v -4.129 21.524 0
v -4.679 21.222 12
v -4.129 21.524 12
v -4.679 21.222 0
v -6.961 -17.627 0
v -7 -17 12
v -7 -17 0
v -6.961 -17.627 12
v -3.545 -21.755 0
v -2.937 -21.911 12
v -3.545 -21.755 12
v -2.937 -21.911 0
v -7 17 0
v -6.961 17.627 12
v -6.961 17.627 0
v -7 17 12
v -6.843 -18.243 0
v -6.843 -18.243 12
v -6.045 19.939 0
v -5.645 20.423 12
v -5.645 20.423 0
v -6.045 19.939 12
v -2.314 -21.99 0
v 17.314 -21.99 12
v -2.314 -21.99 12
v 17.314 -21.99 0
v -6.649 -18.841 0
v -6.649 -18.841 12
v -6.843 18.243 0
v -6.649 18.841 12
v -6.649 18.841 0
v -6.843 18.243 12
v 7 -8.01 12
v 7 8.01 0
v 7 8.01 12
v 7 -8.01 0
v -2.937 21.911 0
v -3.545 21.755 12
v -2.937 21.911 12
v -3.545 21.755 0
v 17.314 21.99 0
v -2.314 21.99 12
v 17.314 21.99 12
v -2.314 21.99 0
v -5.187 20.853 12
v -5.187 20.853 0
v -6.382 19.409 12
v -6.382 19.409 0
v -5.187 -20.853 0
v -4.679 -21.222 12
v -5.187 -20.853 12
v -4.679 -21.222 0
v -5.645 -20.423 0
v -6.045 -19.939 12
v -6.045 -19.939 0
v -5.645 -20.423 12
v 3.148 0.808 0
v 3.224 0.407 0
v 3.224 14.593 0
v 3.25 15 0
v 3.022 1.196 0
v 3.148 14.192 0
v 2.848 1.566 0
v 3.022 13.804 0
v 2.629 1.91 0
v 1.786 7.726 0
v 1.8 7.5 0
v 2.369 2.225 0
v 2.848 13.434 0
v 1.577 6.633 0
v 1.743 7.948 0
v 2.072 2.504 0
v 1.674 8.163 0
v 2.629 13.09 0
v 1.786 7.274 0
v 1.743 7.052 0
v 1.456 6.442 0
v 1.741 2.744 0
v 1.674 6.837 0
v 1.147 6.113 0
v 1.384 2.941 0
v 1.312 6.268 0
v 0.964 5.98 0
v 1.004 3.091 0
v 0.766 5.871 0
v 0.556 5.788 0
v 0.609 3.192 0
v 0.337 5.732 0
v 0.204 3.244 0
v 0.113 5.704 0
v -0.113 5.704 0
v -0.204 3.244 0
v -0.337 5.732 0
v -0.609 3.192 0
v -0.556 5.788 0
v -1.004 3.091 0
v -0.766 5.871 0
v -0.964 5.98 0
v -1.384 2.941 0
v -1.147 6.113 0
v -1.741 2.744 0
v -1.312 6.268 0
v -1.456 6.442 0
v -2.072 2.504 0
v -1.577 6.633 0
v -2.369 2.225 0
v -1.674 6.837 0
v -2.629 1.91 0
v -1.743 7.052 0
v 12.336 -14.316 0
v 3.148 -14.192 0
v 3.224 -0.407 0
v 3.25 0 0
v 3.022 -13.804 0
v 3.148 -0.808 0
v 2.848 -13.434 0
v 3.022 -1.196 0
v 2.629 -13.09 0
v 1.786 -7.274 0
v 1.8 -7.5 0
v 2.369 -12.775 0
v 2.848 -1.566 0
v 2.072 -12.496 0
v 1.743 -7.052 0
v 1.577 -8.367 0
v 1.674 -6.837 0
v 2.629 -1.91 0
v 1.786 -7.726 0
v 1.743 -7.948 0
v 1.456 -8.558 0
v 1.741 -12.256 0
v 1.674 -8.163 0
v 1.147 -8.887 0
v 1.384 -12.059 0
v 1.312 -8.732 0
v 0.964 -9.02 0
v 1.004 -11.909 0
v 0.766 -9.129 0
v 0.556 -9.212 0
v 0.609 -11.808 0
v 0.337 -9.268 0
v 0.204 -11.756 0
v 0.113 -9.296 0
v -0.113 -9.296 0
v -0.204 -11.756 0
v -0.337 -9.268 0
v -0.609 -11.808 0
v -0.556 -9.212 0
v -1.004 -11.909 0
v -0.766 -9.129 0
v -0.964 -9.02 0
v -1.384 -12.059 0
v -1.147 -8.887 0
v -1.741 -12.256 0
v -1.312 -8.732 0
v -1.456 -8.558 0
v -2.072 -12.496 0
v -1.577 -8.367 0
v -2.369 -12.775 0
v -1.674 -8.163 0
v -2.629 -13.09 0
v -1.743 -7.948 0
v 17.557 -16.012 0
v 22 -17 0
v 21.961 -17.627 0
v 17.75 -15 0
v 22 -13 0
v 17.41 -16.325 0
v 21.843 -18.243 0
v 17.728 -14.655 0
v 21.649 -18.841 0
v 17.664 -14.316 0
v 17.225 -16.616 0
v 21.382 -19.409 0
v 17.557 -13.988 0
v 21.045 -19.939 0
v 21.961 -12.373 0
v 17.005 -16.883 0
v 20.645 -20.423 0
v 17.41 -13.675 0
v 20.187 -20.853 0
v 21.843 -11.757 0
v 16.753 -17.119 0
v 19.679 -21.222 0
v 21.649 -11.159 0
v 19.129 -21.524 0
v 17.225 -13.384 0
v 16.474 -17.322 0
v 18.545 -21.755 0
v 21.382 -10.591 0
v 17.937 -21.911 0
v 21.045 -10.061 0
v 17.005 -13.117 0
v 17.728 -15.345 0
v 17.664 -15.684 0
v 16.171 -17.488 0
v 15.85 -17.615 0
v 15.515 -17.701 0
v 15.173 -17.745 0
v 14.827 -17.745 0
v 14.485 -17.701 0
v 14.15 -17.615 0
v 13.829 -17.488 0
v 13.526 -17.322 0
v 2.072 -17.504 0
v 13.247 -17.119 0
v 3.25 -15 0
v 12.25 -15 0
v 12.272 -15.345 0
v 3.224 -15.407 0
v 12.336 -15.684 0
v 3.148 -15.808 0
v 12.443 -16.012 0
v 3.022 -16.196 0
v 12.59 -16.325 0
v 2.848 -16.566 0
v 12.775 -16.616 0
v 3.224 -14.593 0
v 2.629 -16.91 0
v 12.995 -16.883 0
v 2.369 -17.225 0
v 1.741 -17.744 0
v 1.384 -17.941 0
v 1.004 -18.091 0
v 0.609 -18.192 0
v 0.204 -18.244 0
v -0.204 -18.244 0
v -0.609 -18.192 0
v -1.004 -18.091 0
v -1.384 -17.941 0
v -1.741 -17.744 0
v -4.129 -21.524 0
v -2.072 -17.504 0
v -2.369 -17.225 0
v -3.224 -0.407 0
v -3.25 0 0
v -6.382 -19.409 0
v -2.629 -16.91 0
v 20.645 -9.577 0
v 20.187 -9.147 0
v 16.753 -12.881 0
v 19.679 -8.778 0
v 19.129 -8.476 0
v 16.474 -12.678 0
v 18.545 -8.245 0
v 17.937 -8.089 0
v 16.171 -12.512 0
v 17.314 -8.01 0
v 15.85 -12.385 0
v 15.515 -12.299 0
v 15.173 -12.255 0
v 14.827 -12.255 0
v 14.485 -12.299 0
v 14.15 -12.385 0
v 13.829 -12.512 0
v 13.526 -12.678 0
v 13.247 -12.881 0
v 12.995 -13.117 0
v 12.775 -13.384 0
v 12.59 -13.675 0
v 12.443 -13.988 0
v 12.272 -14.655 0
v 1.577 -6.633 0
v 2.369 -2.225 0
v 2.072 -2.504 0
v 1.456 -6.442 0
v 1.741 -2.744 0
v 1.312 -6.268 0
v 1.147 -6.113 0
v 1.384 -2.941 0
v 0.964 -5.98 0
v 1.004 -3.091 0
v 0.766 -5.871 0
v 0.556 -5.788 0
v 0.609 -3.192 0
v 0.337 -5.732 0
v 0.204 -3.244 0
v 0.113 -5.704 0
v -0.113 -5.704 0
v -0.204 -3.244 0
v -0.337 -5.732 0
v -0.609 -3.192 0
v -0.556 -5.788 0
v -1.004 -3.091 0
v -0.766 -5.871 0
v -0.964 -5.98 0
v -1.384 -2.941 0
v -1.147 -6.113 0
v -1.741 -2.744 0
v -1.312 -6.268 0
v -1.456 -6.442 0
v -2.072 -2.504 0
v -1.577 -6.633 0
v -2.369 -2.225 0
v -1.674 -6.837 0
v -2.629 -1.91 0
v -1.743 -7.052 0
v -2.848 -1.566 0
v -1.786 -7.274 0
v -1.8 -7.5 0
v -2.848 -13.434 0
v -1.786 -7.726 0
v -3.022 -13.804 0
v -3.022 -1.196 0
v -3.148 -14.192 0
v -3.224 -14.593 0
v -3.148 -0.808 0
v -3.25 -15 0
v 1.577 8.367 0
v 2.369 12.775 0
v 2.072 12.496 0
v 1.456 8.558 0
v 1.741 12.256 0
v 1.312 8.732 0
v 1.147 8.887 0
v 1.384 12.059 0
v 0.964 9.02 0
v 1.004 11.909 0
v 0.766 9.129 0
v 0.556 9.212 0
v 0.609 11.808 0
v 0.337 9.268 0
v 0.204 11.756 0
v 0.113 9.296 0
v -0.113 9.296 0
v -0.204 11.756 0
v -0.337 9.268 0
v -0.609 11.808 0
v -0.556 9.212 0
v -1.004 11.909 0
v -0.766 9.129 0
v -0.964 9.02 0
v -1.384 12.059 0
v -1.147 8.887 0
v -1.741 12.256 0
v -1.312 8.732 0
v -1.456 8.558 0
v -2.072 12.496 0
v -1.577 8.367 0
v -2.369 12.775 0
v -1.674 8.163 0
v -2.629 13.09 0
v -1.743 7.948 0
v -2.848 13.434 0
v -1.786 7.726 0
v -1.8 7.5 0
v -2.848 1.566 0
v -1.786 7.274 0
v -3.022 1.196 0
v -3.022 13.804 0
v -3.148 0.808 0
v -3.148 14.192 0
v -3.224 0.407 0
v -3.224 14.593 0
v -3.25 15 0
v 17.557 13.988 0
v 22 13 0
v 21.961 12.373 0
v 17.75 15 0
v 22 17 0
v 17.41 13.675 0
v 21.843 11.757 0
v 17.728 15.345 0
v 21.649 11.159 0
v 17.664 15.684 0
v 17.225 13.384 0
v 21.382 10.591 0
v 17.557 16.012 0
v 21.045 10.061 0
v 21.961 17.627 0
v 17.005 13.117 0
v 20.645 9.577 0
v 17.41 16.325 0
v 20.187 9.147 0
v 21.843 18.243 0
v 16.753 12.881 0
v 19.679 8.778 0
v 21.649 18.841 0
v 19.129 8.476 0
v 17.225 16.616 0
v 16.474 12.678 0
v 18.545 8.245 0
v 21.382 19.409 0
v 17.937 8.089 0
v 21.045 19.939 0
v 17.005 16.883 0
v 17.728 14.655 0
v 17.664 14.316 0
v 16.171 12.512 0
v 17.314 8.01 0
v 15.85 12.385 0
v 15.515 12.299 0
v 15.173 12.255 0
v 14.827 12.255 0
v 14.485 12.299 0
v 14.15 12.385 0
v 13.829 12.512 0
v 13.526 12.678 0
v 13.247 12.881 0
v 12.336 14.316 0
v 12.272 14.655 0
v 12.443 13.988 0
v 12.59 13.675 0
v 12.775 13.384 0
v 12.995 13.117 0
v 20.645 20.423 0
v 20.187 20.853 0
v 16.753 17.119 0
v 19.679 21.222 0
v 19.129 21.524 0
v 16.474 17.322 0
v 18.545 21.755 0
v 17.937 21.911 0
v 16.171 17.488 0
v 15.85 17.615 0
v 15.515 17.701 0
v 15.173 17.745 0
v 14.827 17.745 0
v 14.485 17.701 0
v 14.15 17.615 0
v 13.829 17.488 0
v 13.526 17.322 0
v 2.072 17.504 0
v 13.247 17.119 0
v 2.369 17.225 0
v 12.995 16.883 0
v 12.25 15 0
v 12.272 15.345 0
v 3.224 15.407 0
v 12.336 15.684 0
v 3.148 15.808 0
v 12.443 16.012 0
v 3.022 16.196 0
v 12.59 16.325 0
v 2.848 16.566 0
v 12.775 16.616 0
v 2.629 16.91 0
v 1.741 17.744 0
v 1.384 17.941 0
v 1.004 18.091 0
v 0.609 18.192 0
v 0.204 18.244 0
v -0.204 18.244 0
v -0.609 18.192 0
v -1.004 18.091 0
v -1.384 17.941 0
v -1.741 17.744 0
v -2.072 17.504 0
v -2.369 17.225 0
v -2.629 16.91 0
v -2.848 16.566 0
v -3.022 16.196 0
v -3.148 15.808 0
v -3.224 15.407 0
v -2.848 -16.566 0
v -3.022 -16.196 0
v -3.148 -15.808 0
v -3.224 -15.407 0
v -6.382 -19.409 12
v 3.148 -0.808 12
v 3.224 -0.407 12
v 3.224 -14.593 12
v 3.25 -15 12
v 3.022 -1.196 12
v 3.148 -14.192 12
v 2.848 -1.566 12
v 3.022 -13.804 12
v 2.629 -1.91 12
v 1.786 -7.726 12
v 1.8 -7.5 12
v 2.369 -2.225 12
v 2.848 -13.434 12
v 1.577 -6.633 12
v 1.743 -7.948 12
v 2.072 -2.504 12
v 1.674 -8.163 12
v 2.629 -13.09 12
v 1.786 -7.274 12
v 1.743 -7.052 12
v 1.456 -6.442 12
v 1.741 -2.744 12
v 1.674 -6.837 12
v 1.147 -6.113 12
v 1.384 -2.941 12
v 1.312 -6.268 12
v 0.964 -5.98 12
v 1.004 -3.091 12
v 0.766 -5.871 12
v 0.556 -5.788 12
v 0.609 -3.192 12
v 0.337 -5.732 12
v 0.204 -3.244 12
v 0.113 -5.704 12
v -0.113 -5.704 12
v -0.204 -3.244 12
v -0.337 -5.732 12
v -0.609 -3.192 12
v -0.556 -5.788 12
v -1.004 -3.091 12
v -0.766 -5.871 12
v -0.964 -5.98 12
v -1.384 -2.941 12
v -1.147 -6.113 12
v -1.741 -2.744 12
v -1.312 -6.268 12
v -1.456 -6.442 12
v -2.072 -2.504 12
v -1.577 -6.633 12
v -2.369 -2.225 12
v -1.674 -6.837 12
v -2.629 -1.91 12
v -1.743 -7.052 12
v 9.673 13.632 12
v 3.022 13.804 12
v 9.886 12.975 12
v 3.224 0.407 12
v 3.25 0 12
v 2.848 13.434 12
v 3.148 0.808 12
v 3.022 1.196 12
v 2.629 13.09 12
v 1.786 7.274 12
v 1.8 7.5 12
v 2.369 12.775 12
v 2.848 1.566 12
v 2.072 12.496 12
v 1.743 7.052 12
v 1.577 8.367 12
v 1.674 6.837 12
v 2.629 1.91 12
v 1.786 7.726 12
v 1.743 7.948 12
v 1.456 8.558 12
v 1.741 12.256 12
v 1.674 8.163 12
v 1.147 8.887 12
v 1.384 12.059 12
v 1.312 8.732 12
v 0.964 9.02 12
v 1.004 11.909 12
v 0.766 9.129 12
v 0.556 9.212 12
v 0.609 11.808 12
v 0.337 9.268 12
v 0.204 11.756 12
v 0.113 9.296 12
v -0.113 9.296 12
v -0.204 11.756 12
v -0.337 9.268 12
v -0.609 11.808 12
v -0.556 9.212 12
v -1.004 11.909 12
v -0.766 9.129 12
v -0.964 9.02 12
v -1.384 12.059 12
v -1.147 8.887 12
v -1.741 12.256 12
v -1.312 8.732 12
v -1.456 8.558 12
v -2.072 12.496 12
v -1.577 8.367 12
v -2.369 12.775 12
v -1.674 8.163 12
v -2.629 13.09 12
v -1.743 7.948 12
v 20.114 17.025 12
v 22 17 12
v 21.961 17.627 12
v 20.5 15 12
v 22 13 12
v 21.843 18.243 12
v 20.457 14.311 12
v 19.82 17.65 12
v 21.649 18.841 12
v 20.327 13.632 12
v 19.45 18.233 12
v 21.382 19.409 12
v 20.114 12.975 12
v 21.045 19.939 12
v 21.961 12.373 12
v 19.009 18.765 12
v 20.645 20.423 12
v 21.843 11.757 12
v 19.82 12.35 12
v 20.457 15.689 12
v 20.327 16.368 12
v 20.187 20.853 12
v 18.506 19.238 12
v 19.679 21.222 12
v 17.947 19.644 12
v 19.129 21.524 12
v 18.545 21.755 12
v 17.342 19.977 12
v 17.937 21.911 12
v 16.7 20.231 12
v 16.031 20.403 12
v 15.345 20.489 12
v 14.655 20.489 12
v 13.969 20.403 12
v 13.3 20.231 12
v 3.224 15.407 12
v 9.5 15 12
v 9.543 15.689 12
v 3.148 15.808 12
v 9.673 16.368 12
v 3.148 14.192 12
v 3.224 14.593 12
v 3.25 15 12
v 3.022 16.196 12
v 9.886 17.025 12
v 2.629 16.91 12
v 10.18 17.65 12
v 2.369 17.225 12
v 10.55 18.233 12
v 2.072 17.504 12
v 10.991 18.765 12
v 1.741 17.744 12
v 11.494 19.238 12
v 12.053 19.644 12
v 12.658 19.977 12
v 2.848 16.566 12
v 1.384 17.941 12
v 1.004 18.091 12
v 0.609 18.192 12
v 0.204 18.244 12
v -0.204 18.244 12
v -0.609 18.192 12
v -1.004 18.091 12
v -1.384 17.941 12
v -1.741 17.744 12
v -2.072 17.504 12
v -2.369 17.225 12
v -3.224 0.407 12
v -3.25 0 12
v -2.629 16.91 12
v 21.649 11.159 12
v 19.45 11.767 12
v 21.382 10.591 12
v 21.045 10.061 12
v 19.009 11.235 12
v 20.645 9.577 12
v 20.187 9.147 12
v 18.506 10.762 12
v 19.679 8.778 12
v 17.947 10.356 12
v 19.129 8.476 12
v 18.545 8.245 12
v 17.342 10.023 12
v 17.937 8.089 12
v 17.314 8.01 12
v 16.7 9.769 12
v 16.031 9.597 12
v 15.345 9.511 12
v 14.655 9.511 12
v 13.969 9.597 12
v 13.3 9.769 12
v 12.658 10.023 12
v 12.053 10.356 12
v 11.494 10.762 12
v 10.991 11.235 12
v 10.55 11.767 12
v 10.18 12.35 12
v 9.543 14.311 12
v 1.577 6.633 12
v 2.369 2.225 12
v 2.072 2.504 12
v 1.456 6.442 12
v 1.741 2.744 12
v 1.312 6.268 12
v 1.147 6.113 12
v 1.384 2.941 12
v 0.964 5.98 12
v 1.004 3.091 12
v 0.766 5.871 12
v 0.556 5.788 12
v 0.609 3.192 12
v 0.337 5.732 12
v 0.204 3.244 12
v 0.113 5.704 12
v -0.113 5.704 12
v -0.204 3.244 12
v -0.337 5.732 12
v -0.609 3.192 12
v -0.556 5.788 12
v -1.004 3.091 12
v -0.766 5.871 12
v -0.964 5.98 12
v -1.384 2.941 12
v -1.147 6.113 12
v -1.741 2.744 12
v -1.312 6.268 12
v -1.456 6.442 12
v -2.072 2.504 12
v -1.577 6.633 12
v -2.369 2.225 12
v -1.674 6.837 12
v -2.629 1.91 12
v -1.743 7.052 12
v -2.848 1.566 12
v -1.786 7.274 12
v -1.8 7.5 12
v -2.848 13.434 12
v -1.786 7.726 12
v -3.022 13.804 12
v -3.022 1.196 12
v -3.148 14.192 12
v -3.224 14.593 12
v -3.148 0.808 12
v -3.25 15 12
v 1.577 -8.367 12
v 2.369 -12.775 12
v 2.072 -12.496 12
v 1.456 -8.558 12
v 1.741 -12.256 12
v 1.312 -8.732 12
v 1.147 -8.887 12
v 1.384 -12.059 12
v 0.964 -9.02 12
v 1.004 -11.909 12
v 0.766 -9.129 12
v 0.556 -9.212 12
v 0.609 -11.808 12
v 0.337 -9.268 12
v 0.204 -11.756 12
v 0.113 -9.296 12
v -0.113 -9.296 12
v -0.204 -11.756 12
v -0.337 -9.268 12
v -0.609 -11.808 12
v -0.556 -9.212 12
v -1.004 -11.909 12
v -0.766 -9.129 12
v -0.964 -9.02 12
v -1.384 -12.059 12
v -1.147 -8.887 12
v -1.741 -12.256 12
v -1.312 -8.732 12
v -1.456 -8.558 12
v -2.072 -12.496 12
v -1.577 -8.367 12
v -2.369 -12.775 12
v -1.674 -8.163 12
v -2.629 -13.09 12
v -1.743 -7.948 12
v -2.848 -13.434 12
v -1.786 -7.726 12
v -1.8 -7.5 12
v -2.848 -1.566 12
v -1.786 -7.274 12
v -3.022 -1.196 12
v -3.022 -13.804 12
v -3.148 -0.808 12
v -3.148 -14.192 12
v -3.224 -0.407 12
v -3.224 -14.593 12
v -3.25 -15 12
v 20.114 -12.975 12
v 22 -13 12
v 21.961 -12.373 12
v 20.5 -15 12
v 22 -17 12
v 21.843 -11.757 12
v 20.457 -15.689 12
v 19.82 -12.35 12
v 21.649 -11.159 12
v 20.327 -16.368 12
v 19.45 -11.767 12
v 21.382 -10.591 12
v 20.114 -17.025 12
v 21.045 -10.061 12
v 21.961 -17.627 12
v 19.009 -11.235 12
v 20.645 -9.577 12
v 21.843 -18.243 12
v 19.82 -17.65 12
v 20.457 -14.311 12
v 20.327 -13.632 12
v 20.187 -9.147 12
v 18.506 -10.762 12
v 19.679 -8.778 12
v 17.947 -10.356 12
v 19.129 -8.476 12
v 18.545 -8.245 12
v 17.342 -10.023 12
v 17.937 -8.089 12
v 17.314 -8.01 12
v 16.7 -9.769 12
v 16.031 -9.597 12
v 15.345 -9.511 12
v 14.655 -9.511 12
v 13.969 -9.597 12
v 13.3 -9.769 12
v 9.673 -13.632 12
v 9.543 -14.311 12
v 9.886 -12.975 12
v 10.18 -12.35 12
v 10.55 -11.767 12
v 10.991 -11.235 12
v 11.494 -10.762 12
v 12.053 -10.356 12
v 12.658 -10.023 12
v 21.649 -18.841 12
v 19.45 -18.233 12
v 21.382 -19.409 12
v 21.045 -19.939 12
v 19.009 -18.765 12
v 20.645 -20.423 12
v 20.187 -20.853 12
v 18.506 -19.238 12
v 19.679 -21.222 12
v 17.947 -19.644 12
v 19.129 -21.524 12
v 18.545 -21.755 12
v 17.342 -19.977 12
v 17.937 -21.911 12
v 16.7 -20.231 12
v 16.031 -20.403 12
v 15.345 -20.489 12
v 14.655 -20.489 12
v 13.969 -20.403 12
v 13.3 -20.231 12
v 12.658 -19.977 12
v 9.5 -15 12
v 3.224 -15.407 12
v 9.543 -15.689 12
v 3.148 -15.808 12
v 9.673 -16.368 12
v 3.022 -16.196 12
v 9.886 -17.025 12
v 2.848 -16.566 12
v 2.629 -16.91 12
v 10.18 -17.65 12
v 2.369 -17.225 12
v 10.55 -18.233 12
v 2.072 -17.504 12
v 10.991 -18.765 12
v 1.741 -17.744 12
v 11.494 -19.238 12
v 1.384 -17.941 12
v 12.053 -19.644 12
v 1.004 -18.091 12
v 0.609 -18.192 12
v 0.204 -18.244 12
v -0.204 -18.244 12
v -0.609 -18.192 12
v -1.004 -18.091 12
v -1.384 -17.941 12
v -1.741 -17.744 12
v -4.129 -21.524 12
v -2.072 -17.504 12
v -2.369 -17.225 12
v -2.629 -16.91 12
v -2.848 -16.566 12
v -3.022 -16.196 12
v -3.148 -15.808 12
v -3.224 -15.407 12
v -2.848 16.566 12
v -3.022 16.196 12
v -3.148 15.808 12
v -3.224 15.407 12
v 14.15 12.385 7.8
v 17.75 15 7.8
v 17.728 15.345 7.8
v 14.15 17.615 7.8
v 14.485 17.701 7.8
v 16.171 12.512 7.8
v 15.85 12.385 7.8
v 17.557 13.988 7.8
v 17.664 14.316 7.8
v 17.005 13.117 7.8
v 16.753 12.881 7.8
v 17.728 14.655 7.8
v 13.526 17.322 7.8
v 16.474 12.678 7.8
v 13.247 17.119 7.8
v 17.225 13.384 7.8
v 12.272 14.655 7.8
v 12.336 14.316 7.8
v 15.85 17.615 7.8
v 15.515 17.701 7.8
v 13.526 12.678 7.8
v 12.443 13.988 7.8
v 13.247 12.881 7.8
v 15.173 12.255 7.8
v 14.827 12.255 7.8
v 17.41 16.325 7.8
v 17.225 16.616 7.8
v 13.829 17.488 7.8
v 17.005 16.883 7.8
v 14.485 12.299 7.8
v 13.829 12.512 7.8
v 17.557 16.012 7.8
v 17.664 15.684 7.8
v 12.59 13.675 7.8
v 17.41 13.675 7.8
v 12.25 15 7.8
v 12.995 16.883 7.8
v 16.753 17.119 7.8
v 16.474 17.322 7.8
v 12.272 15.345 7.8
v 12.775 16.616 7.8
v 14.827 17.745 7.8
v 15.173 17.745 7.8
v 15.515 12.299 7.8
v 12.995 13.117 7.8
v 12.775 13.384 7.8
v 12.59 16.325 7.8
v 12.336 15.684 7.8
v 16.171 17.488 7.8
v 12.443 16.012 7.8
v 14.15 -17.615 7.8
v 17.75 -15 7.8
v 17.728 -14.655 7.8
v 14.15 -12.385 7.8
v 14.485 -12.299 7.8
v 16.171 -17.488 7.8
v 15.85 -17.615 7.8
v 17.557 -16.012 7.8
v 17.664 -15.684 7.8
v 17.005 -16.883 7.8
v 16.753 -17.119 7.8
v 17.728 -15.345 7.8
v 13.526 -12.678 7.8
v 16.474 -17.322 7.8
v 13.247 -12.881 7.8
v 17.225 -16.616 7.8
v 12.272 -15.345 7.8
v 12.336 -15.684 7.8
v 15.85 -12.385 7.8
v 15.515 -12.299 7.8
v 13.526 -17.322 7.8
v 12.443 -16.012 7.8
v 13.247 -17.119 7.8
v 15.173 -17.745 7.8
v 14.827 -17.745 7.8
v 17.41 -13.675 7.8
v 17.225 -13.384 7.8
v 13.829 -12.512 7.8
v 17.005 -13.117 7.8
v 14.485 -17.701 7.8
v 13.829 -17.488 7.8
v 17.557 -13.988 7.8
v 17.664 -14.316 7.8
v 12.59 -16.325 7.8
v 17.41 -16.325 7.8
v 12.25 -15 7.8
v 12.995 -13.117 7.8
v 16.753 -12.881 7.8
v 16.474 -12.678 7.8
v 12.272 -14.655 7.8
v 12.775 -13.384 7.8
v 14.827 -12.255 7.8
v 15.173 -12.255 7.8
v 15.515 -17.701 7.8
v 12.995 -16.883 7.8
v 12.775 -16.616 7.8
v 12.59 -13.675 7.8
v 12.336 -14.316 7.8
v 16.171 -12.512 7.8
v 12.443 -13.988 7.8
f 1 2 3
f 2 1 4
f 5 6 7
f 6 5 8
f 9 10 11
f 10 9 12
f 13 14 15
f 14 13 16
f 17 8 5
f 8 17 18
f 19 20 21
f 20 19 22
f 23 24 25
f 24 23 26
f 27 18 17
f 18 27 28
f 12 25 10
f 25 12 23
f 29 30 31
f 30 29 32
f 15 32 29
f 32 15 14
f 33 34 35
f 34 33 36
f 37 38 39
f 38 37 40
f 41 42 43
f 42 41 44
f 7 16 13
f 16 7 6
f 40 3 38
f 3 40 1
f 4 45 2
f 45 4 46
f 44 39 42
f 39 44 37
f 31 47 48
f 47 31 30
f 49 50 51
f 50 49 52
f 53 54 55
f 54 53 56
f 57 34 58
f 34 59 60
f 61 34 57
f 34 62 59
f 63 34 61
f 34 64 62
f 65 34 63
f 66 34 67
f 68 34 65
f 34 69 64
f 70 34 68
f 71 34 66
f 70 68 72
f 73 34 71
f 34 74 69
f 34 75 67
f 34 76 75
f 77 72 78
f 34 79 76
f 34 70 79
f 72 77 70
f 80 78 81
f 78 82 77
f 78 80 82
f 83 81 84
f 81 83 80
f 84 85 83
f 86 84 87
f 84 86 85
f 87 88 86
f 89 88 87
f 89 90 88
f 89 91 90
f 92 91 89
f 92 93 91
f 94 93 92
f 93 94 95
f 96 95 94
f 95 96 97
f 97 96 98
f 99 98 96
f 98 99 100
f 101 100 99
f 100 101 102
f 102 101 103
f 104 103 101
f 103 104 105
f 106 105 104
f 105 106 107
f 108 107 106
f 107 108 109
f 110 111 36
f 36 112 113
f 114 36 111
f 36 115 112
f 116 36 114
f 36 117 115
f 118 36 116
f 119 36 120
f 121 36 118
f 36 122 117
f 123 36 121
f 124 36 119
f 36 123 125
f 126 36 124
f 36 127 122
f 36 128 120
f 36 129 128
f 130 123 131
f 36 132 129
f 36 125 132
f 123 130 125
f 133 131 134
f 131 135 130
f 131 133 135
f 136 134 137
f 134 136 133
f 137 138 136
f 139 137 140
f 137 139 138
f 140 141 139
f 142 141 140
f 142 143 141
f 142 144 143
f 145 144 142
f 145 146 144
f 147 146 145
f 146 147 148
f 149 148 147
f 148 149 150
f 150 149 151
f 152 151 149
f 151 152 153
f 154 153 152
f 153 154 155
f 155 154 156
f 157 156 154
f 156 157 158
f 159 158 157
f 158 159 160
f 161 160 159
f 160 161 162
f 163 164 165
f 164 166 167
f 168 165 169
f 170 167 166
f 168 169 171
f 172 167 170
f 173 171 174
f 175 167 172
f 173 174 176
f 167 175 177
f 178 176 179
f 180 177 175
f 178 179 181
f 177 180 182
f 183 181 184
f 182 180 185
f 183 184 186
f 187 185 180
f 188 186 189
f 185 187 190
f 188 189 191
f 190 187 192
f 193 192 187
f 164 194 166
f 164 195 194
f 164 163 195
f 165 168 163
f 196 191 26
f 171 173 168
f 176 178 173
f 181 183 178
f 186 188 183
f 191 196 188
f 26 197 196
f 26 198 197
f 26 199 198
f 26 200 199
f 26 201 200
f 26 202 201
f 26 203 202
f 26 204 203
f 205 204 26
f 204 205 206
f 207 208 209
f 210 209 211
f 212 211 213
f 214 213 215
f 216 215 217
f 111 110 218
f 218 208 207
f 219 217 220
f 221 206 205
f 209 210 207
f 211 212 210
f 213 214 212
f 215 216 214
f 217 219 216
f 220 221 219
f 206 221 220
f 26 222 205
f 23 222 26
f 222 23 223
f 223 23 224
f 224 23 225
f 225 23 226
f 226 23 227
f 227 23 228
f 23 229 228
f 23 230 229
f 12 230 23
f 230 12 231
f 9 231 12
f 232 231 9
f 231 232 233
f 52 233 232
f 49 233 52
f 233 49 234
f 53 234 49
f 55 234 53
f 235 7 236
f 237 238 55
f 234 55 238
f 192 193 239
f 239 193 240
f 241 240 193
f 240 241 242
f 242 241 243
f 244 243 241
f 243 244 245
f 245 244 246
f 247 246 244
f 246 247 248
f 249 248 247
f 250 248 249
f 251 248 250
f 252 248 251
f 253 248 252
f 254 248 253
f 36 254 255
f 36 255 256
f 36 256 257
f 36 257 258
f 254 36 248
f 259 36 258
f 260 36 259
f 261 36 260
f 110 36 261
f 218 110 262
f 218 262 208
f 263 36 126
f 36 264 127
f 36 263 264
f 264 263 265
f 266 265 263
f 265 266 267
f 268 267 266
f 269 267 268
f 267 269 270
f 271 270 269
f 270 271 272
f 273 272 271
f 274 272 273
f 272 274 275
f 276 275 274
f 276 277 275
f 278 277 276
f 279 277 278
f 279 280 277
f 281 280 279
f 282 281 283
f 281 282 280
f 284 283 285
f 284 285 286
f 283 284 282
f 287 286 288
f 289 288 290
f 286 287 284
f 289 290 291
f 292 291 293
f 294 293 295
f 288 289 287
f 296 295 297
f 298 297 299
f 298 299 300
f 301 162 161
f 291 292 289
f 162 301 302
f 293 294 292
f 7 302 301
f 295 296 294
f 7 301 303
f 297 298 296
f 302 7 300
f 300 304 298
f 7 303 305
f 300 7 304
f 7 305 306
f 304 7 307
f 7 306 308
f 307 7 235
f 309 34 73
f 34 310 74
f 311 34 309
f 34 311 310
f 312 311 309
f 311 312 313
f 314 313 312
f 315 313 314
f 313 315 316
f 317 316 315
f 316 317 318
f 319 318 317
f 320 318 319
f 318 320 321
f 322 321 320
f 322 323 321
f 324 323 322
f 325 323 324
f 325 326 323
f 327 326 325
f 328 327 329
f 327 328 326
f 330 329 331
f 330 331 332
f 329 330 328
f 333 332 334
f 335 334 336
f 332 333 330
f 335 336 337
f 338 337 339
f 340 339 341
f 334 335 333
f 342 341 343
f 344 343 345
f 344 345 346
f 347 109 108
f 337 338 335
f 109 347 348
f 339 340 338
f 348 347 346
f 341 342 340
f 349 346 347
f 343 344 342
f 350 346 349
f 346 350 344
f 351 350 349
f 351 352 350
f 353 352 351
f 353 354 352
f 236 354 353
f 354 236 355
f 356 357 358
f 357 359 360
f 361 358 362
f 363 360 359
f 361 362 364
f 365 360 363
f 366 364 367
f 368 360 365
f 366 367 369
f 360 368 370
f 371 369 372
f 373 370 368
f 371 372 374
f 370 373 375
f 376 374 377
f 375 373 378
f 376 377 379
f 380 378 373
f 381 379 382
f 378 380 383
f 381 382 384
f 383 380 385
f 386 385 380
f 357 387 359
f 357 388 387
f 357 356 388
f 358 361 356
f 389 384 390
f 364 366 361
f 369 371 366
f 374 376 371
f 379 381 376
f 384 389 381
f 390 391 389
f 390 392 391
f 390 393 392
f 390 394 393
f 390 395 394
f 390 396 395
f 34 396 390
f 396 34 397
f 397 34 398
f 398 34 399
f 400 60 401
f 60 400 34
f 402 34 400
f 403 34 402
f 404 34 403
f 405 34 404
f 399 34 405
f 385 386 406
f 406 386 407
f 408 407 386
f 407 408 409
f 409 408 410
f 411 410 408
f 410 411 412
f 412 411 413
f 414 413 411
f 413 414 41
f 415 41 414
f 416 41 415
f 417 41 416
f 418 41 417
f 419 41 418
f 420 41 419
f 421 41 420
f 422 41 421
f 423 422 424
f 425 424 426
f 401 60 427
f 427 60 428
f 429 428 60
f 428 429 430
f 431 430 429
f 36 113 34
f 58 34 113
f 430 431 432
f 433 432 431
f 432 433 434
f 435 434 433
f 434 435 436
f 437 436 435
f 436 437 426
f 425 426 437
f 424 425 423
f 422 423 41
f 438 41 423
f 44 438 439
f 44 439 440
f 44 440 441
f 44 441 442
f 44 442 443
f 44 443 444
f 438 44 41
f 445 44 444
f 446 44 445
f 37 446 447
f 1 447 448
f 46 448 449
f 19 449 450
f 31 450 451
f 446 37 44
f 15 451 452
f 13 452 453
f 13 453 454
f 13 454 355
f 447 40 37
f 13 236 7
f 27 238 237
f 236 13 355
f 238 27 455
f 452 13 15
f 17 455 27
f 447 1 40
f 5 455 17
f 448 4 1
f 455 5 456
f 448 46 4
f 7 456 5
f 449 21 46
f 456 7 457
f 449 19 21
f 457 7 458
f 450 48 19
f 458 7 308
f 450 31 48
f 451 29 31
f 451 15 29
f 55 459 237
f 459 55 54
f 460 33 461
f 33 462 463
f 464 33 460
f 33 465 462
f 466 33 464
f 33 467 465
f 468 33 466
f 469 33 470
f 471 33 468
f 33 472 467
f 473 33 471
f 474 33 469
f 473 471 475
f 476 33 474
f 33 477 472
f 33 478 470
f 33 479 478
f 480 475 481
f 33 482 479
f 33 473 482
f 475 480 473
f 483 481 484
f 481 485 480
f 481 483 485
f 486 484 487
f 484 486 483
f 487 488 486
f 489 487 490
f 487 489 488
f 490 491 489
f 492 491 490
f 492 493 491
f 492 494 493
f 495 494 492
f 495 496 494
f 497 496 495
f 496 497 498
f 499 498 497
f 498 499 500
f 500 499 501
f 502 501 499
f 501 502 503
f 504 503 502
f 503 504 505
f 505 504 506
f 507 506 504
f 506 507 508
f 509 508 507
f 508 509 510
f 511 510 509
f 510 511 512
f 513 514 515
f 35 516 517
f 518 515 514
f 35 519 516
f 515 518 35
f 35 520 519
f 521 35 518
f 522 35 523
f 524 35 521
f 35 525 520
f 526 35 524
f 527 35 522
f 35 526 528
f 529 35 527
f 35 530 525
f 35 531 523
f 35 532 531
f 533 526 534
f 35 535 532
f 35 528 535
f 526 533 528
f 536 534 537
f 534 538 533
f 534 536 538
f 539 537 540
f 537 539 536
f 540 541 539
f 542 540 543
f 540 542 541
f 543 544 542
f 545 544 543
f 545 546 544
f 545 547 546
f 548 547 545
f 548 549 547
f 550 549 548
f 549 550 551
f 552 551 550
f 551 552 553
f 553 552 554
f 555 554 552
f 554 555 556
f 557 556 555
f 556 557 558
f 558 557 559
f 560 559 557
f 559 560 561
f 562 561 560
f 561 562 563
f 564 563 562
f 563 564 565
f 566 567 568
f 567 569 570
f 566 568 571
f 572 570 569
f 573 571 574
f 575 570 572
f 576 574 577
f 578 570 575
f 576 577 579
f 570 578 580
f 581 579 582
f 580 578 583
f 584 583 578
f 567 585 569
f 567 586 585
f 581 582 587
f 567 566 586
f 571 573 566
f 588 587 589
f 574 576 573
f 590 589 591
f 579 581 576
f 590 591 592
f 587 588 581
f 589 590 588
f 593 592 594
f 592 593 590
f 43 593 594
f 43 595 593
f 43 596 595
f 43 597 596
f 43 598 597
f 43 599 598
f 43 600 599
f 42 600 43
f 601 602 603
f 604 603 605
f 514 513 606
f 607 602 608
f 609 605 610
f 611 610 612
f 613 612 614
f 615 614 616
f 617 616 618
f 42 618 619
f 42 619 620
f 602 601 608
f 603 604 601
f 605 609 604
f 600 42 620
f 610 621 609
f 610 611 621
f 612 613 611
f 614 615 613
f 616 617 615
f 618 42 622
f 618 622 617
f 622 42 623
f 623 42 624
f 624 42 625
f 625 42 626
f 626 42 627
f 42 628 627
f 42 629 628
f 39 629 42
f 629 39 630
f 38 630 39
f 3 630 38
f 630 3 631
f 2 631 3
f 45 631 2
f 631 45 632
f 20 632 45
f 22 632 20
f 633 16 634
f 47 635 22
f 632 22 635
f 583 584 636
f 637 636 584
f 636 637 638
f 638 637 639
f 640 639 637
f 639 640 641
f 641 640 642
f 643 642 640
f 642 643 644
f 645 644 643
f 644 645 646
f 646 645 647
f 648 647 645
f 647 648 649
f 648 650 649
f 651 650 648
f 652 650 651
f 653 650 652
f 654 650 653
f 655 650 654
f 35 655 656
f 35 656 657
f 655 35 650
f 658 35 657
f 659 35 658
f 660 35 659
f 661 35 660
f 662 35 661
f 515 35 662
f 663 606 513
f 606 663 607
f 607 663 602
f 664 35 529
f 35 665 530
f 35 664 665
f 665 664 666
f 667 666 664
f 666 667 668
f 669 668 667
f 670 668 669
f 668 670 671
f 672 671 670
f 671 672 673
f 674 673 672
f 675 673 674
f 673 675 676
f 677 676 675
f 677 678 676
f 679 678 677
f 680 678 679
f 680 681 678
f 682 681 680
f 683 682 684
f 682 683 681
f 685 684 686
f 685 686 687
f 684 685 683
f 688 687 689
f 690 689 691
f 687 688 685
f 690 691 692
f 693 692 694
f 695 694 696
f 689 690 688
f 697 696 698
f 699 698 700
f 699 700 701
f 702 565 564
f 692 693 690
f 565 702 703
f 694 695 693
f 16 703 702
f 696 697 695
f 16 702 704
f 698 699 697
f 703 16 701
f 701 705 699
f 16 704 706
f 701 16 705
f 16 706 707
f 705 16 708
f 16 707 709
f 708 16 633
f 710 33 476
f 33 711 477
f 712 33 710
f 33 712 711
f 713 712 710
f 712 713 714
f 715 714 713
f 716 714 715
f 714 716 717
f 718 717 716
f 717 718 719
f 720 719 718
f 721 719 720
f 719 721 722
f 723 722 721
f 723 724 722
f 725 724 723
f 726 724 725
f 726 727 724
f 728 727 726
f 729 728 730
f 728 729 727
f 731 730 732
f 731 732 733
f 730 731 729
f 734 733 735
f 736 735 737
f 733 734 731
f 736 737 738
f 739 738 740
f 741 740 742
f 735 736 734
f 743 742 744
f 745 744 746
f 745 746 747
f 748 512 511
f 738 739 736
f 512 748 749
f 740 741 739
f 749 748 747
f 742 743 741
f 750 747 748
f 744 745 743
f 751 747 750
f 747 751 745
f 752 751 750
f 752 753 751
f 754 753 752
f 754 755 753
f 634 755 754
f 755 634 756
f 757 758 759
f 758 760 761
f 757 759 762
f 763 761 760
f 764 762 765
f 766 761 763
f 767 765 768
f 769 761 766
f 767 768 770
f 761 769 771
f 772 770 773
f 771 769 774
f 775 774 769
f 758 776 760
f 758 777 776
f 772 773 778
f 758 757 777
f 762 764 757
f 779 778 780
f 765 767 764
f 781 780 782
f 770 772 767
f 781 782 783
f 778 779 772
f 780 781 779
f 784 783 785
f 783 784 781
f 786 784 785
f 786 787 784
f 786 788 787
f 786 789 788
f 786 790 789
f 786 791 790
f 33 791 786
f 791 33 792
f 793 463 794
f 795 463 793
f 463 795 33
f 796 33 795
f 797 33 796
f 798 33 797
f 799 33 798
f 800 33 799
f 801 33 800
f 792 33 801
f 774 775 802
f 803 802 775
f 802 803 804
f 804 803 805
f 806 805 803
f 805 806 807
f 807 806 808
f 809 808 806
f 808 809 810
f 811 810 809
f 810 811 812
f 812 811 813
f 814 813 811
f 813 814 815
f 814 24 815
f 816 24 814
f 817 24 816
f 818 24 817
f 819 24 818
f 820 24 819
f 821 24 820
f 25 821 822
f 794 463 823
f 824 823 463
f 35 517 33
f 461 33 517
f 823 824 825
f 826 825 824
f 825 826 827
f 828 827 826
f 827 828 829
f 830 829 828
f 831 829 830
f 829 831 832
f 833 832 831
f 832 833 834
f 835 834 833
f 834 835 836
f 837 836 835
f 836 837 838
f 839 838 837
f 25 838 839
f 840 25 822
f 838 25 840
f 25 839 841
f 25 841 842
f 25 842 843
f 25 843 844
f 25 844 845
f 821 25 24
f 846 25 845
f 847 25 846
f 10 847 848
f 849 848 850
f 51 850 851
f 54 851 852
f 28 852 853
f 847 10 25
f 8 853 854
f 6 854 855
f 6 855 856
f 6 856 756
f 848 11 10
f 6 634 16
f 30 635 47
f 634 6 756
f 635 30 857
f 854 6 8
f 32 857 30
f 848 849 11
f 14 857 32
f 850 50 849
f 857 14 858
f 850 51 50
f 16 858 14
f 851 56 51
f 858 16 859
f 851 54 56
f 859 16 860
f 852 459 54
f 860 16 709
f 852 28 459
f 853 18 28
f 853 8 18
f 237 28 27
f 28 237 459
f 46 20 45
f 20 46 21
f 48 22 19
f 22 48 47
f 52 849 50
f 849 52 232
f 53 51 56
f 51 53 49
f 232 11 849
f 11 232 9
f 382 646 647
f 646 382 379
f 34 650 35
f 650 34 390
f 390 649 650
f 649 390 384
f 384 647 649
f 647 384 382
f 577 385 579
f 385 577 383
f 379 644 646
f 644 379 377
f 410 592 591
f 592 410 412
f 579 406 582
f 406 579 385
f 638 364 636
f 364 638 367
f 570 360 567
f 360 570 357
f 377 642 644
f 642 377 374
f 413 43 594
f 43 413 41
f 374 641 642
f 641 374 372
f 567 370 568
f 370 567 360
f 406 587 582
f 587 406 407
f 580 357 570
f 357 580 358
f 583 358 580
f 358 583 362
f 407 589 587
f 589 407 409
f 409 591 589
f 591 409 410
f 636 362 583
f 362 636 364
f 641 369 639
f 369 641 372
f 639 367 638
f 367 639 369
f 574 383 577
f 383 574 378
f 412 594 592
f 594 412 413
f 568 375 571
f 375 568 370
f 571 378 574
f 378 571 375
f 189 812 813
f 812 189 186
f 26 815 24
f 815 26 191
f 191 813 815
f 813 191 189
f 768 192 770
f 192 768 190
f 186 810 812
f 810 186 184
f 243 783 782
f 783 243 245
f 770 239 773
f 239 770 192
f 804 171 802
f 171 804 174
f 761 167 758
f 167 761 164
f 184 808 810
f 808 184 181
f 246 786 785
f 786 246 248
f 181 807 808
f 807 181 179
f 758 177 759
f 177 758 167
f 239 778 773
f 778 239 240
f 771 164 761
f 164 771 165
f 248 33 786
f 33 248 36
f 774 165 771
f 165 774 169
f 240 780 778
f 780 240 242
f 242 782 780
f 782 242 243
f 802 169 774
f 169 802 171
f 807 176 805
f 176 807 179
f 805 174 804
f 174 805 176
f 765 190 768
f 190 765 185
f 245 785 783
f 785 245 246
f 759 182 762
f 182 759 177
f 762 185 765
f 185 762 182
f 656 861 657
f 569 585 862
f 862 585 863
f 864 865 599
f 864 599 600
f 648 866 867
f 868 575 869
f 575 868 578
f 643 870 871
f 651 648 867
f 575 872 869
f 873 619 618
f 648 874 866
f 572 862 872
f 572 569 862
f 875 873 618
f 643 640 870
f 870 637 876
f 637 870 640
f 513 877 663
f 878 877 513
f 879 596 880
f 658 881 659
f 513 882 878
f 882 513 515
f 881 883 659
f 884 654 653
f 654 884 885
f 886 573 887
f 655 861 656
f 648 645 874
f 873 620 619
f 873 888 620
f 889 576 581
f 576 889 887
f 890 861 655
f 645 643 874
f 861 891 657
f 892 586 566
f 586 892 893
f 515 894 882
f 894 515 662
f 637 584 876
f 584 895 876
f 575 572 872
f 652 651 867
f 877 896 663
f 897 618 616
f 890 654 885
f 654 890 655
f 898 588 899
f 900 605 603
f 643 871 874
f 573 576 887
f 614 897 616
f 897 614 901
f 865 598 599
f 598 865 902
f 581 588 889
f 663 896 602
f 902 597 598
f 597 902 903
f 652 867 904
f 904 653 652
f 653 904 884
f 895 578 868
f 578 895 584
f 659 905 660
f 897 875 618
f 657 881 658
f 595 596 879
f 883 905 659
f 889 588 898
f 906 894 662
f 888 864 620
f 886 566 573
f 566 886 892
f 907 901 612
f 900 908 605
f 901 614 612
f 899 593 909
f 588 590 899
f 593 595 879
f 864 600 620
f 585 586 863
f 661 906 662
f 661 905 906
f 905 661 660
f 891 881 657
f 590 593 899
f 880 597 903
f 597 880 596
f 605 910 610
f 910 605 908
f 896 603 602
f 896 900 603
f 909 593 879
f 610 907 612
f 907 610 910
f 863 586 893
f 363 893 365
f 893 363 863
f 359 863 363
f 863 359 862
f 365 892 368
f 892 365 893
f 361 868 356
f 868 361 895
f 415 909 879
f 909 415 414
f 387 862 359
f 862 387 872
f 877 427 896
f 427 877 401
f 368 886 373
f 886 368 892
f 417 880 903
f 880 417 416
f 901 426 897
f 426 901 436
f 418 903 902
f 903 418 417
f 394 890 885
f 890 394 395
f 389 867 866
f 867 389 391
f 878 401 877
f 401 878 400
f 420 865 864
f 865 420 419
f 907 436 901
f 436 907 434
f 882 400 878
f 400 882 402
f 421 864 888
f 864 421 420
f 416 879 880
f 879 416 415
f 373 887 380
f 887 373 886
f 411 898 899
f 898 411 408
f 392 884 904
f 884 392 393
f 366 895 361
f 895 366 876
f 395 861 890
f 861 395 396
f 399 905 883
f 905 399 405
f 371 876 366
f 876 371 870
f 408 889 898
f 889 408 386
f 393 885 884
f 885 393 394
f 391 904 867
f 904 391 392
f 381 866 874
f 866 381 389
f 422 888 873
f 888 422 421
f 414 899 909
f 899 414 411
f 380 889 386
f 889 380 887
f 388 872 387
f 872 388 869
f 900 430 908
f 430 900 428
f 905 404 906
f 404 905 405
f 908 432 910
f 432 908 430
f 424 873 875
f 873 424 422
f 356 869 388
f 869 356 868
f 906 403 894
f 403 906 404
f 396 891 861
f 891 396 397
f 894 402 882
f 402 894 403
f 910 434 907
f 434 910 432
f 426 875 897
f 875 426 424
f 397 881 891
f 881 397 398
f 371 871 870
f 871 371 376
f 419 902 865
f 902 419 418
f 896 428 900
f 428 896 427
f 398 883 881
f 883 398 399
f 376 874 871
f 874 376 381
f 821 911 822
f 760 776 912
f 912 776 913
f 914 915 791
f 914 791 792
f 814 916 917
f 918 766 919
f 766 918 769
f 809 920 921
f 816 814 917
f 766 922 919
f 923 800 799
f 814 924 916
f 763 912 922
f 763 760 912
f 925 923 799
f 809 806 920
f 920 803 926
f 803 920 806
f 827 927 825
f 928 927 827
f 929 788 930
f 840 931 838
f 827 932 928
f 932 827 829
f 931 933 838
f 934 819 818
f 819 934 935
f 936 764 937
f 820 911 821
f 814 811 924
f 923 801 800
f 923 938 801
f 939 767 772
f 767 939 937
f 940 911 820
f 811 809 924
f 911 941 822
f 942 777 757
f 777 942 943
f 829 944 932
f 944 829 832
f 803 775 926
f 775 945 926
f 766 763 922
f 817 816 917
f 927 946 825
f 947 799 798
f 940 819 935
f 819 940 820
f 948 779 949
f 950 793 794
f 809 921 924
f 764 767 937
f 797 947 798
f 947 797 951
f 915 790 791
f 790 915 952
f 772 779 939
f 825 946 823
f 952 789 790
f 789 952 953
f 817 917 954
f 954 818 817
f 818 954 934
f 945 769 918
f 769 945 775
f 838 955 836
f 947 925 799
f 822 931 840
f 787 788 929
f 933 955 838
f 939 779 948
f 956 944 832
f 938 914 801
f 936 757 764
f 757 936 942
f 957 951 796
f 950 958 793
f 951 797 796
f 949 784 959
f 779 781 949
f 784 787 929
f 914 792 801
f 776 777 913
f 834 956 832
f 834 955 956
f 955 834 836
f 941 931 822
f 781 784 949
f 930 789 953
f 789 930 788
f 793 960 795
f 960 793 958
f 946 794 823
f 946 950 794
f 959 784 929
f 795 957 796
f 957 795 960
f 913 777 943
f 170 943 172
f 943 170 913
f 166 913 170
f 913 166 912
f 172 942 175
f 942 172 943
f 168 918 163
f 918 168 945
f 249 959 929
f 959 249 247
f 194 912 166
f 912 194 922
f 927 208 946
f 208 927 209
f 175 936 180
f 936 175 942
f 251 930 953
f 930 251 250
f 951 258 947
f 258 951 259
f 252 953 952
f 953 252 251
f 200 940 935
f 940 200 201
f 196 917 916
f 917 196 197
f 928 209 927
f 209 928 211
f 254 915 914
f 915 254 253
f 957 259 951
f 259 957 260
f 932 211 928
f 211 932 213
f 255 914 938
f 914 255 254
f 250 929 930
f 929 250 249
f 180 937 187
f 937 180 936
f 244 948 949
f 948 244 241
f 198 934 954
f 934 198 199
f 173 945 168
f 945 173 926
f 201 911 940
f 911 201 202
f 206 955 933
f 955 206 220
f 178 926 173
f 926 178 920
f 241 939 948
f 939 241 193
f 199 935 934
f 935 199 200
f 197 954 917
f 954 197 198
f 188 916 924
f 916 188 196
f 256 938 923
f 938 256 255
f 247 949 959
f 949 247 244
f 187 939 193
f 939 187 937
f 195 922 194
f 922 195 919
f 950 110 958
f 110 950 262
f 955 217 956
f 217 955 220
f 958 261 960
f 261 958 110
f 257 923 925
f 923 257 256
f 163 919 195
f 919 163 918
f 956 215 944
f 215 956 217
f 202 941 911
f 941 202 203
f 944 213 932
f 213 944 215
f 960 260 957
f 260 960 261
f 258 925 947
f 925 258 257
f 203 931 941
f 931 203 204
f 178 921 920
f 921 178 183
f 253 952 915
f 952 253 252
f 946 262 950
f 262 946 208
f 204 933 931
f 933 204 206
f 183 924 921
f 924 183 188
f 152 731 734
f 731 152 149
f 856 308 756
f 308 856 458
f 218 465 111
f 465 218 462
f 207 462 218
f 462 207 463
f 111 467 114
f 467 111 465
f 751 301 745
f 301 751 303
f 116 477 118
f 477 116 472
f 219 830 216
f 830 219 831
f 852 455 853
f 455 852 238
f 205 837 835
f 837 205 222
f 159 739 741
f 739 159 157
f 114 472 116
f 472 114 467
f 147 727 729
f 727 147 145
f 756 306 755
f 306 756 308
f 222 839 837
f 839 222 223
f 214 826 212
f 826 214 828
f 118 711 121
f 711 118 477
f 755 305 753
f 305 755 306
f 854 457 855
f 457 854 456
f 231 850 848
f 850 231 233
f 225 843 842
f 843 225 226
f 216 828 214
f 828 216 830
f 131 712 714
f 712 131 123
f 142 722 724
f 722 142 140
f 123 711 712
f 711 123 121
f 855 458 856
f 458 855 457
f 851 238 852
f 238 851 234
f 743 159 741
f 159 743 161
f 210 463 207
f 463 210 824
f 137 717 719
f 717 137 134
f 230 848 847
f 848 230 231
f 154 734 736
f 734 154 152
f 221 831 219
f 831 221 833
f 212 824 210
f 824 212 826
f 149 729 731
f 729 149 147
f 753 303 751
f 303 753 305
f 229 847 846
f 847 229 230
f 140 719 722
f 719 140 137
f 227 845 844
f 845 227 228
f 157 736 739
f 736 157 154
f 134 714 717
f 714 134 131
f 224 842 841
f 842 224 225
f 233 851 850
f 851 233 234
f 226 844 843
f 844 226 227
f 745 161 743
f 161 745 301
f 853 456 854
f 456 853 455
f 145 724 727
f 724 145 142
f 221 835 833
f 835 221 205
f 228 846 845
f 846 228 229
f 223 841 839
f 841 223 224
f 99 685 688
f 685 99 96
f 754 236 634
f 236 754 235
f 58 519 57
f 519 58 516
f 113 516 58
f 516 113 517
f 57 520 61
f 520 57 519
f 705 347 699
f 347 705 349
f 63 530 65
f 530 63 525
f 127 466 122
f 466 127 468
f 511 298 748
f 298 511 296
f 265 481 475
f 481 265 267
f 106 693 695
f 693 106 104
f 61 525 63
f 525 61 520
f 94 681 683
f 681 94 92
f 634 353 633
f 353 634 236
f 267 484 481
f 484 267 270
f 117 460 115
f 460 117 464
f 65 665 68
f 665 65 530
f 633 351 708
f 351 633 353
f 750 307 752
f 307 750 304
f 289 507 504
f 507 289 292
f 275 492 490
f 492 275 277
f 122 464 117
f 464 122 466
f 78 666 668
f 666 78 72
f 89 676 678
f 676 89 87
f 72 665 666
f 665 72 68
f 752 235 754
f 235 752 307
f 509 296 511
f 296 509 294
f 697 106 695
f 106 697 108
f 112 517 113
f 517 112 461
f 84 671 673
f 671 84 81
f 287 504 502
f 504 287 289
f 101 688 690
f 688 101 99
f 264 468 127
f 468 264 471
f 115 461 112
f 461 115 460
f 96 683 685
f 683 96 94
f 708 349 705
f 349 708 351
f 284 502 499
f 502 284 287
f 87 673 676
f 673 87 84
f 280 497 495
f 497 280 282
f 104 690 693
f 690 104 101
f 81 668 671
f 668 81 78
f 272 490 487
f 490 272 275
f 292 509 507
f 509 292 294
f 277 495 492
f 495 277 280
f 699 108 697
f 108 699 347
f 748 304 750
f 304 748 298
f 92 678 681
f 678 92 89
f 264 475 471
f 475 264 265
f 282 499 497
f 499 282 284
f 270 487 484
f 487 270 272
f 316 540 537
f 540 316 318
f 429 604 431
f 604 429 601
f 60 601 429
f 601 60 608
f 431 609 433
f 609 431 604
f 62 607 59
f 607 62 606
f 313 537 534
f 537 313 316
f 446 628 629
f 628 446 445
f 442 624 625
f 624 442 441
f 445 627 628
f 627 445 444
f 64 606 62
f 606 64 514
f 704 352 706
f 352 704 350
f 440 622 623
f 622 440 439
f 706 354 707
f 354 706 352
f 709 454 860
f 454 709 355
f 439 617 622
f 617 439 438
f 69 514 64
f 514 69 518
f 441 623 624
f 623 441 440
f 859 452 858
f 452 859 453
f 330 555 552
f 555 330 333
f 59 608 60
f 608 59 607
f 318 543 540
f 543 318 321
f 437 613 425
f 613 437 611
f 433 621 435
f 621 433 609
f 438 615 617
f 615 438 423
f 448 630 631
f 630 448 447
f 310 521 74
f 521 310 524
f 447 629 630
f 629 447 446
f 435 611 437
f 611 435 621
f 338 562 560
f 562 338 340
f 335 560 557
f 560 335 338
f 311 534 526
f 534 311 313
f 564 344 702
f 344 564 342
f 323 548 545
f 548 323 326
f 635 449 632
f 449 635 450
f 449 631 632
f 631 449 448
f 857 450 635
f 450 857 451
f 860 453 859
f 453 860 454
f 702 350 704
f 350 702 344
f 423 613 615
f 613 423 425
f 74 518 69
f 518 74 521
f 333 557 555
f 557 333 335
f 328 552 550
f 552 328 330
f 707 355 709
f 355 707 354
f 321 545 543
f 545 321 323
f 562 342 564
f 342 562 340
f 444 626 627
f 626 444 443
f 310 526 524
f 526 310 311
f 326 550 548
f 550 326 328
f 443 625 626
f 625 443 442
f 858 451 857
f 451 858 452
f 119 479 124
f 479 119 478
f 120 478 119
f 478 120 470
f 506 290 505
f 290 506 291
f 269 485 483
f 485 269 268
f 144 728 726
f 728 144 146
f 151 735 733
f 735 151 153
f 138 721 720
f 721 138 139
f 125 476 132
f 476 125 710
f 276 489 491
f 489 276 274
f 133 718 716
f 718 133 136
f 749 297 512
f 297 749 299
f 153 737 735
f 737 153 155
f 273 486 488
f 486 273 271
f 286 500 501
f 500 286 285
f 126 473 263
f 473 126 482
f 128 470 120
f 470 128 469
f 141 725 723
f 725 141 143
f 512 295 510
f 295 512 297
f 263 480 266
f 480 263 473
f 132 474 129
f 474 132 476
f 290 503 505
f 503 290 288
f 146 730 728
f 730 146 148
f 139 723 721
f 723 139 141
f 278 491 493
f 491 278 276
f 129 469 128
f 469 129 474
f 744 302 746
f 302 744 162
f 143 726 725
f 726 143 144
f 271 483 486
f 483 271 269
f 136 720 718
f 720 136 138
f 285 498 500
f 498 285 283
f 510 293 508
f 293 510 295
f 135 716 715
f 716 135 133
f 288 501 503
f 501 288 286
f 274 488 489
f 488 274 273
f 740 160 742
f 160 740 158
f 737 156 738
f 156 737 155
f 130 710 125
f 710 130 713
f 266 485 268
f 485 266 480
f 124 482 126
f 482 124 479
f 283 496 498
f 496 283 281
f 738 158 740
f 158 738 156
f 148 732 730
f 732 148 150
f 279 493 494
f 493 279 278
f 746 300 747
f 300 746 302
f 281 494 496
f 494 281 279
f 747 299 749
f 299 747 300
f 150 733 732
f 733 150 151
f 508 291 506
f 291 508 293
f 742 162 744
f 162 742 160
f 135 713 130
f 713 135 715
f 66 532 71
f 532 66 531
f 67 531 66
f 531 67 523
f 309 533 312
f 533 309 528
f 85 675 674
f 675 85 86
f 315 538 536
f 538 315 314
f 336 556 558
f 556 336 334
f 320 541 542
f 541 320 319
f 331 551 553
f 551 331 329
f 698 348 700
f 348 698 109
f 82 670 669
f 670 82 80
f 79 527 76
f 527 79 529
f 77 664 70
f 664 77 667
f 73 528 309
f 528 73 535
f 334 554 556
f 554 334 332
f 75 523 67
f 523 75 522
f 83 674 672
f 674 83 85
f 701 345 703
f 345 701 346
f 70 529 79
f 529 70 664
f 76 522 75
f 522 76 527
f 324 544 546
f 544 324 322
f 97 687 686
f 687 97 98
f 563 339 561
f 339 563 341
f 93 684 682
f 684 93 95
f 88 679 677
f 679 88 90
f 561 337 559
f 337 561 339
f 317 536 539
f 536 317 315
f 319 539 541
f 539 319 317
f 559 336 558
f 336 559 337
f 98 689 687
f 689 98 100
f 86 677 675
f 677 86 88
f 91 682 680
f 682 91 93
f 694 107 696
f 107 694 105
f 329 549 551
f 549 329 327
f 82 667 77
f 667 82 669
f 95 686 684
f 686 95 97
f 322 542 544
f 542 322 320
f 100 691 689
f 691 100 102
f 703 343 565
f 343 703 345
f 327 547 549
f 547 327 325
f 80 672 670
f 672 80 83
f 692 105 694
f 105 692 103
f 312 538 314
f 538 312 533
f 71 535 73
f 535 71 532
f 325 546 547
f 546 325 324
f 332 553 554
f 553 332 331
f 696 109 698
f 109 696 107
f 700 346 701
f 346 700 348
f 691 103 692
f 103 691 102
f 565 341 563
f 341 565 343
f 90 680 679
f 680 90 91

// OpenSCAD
$fn = 50;


difference() {
	union() {
		hull() {
			translate(v = [-2.0000000000, 17.0000000000, 0]) {
				cylinder(h = 12, r = 5);
			}
			translate(v = [2.0000000000, 17.0000000000, 0]) {
				cylinder(h = 12, r = 5);
			}
			translate(v = [-2.0000000000, -17.0000000000, 0]) {
				cylinder(h = 12, r = 5);
			}
			translate(v = [2.0000000000, -17.0000000000, 0]) {
				cylinder(h = 12, r = 5);
			}
		}
		translate(v = [7.5000000000, 15.0000000000, 0]) {
			hull() {
				translate(v = [-9.5000000000, 2.0000000000, 0]) {
					cylinder(h = 12, r = 5);
				}
				translate(v = [9.5000000000, 2.0000000000, 0]) {
					cylinder(h = 12, r = 5);
				}
				translate(v = [-9.5000000000, -2.0000000000, 0]) {
					cylinder(h = 12, r = 5);
				}
				translate(v = [9.5000000000, -2.0000000000, 0]) {
					cylinder(h = 12, r = 5);
				}
			}
		}
		translate(v = [7.5000000000, -15.0000000000, 0]) {
			hull() {
				translate(v = [-9.5000000000, 2.0000000000, 0]) {
					cylinder(h = 12, r = 5);
				}
				translate(v = [9.5000000000, 2.0000000000, 0]) {
					cylinder(h = 12, r = 5);
				}
				translate(v = [-9.5000000000, -2.0000000000, 0]) {
					cylinder(h = 12, r = 5);
				}
				translate(v = [9.5000000000, -2.0000000000, 0]) {
					cylinder(h = 12, r = 5);
				}
			}
		}
	}
	union() {
		translate(v = [15.0000000000, 15.0000000000, 12]) {
			rotate(a = [0, 0, 0]) {
				difference() {
					union() {
						#translate(v = [0, 0, -12.0000000000]) {
							cylinder(h = 12, r = 2.2500000000);
						}
						#translate(v = [0, 0, -4.2000000000]) {
							cylinder(h = 4.2000000000, r1 = 2.7500000000, r2 = 5.5000000000);
						}
						#translate(v = [0, 0, -12.0000000000]) {
							cylinder(h = 12, r = 2.7500000000);
						}
						#translate(v = [0, 0, -12.0000000000]) {
							cylinder(h = 12, r = 2.2500000000);
						}
					}
					union();
				}
			}
		}
		translate(v = [15.0000000000, -15.0000000000, 12]) {
			rotate(a = [0, 0, 0]) {
				difference() {
					union() {
						#translate(v = [0, 0, -12.0000000000]) {
							cylinder(h = 12, r = 2.2500000000);
						}
						#translate(v = [0, 0, -4.2000000000]) {
							cylinder(h = 4.2000000000, r1 = 2.7500000000, r2 = 5.5000000000);
						}
						#translate(v = [0, 0, -12.0000000000]) {
							cylinder(h = 12, r = 2.7500000000);
						}
						#translate(v = [0, 0, -12.0000000000]) {
							cylinder(h = 12, r = 2.2500000000);
						}
					}
					union();
				}
			}
		}
		translate(v = [0.0000000000, -15.0000000000, 0]) {
			translate(v = [0, 0, -100]) {
				cylinder(h = 200, r = 3.2500000000);
			}
		}
		translate(v = [0, 0, -100]) {
			cylinder(h = 200, r = 3.2500000000);
		}
		translate(v = [0.0000000000, 15.0000000000, 0]) {
			translate(v = [0, 0, -100]) {
				cylinder(h = 200, r = 3.2500000000);
			}
		}
		translate(v = [0.0000000000, -15.0000000000, 0]) {
			translate(v = [0, 0, -100]) {
				cylinder(h = 200, r = 1.8000000000);
			}
		}
		translate(v = [0.0000000000, -7.5000000000, 0]) {
			translate(v = [0, 0, -100]) {
				cylinder(h = 200, r = 1.8000000000);
			}
		}
		translate(v = [0, 0, -100]) {
			cylinder(h = 200, r = 1.8000000000);
		}
		translate(v = [0.0000000000, 7.5000000000, 0]) {
			translate(v = [0, 0, -100]) {
				cylinder(h = 200, r = 1.8000000000);
			}
		}
		translate(v = [0.0000000000, 15.0000000000, 0]) {
			translate(v = [0, 0, -100]) {
				cylinder(h = 200, r = 1.8000000000);
			}
		}
	}
}
